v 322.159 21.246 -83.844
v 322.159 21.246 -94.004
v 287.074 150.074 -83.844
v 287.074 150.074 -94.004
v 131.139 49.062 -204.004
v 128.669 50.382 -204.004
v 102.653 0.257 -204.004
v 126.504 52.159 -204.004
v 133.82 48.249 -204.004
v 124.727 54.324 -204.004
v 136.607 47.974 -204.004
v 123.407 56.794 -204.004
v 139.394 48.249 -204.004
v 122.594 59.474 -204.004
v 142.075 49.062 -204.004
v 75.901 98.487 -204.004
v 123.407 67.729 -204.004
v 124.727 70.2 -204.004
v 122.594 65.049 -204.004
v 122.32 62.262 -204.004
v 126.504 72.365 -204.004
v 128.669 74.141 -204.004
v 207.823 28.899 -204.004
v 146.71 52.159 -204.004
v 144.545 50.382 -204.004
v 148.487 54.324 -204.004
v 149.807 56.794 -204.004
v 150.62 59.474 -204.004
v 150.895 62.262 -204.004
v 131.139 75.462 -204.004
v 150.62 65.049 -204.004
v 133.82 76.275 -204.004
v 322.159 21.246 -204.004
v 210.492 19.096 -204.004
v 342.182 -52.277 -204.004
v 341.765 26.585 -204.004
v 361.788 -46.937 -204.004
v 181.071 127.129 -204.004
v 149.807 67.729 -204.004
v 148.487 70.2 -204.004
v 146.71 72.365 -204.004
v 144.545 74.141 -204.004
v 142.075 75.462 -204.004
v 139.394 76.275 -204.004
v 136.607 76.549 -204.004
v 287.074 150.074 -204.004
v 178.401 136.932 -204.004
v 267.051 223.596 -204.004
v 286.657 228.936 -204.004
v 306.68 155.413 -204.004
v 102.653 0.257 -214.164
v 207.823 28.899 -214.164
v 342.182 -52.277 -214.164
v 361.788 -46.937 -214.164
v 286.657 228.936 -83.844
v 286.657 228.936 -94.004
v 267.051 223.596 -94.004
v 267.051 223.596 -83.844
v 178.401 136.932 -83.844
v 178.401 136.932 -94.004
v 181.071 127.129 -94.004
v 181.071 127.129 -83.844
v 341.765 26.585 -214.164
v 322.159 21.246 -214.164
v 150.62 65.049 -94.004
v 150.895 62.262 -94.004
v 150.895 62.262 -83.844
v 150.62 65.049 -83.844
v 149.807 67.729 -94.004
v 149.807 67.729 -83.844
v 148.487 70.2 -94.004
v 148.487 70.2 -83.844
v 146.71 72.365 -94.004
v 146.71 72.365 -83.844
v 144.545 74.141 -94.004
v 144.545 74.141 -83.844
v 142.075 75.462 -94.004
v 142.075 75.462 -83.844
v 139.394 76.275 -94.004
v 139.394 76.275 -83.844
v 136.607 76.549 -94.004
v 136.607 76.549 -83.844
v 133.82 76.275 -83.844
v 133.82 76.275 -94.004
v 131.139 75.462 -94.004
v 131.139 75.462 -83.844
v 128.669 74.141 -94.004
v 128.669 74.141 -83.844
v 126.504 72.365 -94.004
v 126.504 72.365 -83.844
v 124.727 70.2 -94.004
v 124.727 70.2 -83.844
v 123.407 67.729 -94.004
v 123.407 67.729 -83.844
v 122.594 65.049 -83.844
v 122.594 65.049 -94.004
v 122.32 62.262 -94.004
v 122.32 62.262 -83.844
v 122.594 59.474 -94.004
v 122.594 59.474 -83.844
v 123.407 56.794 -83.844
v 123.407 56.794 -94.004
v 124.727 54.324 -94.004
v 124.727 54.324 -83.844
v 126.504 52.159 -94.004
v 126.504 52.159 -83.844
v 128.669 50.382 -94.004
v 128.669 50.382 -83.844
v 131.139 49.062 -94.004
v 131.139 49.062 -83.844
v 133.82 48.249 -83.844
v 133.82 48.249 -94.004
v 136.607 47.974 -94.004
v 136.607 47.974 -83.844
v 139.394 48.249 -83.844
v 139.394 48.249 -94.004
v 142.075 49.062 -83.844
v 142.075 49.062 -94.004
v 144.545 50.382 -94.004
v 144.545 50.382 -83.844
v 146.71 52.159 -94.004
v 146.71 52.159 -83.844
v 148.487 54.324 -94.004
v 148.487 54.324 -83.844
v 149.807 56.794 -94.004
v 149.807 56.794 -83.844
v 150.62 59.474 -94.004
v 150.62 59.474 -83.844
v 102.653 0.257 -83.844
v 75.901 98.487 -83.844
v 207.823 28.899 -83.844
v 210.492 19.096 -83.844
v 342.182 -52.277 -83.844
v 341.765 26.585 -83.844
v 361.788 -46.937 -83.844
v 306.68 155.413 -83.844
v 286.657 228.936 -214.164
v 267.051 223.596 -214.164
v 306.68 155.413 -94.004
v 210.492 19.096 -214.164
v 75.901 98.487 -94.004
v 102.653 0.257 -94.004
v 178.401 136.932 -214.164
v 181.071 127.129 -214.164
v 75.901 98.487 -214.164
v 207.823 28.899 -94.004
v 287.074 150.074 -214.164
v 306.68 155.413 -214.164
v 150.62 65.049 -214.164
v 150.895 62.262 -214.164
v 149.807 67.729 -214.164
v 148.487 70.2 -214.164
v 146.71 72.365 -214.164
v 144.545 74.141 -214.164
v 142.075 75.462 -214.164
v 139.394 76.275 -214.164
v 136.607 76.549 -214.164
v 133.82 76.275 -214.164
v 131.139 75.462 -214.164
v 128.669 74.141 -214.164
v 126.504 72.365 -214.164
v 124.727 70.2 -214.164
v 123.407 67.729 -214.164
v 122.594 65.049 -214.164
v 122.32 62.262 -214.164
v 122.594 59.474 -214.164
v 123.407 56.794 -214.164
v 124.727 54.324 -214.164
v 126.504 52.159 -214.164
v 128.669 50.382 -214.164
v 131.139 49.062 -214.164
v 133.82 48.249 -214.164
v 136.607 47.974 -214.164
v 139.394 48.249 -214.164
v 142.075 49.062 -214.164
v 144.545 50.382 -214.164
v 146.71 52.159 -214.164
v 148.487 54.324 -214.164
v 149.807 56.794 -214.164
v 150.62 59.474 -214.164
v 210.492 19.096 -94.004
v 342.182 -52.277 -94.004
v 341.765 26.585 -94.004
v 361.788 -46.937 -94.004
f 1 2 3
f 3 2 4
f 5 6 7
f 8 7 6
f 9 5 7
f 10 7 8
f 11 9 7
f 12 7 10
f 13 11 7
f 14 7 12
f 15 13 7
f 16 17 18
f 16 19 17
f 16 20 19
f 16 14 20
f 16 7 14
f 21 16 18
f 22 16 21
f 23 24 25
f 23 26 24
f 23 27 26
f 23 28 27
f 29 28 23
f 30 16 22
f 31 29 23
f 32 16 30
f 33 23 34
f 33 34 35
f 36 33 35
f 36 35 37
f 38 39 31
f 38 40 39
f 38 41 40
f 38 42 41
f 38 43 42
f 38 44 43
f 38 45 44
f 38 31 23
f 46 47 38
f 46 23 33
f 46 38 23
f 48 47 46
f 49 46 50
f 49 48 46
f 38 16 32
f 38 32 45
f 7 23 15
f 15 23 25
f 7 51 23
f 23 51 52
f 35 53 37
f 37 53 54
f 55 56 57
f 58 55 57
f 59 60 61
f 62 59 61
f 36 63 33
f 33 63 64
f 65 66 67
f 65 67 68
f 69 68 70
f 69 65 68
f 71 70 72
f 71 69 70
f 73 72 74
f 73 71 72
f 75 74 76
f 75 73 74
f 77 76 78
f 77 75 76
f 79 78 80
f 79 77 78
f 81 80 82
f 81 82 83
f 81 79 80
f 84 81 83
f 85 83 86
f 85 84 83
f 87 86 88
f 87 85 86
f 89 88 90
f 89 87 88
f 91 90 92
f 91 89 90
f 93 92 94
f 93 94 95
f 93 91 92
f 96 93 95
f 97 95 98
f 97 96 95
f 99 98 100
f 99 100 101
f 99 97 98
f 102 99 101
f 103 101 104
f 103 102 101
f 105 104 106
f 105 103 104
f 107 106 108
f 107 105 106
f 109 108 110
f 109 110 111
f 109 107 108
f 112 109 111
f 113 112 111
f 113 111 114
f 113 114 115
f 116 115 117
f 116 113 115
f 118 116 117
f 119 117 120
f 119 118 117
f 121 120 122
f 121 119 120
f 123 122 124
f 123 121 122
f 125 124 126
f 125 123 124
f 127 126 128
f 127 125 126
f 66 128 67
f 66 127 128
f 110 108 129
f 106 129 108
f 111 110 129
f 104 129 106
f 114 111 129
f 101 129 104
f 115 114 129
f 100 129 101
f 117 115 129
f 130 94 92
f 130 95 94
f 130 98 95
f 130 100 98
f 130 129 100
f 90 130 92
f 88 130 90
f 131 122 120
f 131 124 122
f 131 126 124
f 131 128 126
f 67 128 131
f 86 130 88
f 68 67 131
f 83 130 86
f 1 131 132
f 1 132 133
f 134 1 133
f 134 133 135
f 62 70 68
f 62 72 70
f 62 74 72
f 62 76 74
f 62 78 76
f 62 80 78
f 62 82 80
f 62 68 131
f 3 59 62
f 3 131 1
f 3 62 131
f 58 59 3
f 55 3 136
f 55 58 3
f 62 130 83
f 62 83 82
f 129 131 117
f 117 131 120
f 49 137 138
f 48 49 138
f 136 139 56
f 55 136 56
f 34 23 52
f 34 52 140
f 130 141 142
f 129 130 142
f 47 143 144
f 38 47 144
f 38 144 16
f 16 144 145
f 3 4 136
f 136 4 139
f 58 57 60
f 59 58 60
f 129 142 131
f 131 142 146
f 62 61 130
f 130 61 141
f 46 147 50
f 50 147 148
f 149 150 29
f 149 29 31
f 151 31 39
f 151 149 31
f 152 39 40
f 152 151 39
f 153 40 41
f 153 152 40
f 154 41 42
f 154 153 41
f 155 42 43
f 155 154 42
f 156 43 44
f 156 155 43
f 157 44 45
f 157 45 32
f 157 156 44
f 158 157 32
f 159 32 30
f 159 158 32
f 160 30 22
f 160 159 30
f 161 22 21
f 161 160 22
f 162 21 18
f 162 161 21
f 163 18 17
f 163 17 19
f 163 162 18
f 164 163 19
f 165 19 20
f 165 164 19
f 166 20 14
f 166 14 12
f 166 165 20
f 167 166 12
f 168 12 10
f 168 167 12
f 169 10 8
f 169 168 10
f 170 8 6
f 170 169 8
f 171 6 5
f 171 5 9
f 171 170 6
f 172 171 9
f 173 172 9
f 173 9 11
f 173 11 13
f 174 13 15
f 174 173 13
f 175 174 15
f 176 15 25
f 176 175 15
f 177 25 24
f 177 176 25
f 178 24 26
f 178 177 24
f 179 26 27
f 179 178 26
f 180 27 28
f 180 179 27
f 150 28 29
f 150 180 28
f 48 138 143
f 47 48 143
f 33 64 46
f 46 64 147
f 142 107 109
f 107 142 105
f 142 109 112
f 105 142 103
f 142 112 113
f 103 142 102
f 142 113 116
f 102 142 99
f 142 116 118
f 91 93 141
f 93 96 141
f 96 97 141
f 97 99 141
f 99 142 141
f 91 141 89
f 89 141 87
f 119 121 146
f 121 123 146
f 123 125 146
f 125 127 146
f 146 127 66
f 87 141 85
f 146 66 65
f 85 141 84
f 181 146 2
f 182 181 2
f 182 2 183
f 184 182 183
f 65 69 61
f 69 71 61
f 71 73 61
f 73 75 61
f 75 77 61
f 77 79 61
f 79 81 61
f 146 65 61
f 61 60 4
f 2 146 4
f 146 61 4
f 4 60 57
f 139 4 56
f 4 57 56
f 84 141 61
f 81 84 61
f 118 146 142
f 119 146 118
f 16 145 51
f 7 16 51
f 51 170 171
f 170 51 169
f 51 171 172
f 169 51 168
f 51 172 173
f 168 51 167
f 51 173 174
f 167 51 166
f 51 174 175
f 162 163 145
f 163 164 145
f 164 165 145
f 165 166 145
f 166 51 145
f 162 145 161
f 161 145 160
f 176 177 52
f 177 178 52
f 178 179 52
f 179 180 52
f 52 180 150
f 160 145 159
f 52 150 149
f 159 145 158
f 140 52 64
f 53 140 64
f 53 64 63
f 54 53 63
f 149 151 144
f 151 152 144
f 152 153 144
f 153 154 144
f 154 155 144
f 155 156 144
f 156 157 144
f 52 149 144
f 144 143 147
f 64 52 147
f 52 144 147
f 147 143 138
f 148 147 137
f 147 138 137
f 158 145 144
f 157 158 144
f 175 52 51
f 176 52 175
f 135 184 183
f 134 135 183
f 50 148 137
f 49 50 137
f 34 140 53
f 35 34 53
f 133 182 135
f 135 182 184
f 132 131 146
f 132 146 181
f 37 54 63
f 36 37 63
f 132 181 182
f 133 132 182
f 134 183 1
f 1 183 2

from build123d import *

# Parameters (mm, degrees)
BOSS_EXTRUDE1_START = -90
SKETCH1_R           = 14.2875
BOSS_EXTRUDE1_DEPTH = 10.16
BOSS_EXTRUDE2_START = -210.16
SKETCH1_2_R         = 14.2875
BOSS_EXTRUDE2_DEPTH = 10.16


with BuildPart() as part:
    # Sketch1 → Boss-Extrude1 (new body)
    with BuildSketch(Plane(origin=(2328.589821282, 466.462033654, -4.0040129), x_dir=(0.9648587645409115, 0.26276903259057416, 0), z_dir=(0, 0, 1)).offset(BOSS_EXTRUDE1_START)):
        Polygon((-2161.218921834, 236.892663878), (-2270.218921834, 236.892663878), (-2270.218921834, 135.08549762), (-2161.218921834, 135.08549762), (-2161.218921834, 124.92549762), (-2052.911580455, 21.456991118), (-2032.591580455, 21.456991118), (-2032.591580455, 97.656991118), (-2052.911580455, 97.656991118), (-2052.911580455, 231.177276923), (-2032.591580455, 231.177276923), (-2032.591580455, 307.377276923), (-2052.911580455, 307.377276923), (-2161.218921834, 247.052663878), align=None)
        with Locations((-2221.165130355, 185.989080749)):
            Circle(SKETCH1_R, mode=Mode.SUBTRACT)
    extrude(amount=BOSS_EXTRUDE1_DEPTH)


with BuildPart() as body_2:
    # Sketch1<2> → Boss-Extrude2 (new body)
    with BuildSketch(Plane(origin=(2328.589821282, 466.462033654, -4.0040129), x_dir=(0.9648587645409115, 0.26276903259057416, 0), z_dir=(0, 0, 1)).offset(BOSS_EXTRUDE2_START)):
        Polygon((-2161.218921834, 236.892663878), (-2270.218921834, 236.892663878), (-2270.218921834, 135.08549762), (-2161.218921834, 135.08549762), (-2161.218921834, 124.92549762), (-2052.911580455, 21.456991118), (-2032.591580455, 21.456991118), (-2032.591580455, 97.656991118), (-2052.911580455, 97.656991118), (-2052.911580455, 231.177276923), (-2032.591580455, 231.177276923), (-2032.591580455, 307.377276923), (-2052.911580455, 307.377276923), (-2161.218921834, 247.052663878), align=None)
        with Locations((-2221.165130355, 185.989080749)):
            Circle(SKETCH1_2_R, mode=Mode.SUBTRACT)
    extrude(amount=BOSS_EXTRUDE2_DEPTH)


solid = Compound([part.part, body_2.part])
